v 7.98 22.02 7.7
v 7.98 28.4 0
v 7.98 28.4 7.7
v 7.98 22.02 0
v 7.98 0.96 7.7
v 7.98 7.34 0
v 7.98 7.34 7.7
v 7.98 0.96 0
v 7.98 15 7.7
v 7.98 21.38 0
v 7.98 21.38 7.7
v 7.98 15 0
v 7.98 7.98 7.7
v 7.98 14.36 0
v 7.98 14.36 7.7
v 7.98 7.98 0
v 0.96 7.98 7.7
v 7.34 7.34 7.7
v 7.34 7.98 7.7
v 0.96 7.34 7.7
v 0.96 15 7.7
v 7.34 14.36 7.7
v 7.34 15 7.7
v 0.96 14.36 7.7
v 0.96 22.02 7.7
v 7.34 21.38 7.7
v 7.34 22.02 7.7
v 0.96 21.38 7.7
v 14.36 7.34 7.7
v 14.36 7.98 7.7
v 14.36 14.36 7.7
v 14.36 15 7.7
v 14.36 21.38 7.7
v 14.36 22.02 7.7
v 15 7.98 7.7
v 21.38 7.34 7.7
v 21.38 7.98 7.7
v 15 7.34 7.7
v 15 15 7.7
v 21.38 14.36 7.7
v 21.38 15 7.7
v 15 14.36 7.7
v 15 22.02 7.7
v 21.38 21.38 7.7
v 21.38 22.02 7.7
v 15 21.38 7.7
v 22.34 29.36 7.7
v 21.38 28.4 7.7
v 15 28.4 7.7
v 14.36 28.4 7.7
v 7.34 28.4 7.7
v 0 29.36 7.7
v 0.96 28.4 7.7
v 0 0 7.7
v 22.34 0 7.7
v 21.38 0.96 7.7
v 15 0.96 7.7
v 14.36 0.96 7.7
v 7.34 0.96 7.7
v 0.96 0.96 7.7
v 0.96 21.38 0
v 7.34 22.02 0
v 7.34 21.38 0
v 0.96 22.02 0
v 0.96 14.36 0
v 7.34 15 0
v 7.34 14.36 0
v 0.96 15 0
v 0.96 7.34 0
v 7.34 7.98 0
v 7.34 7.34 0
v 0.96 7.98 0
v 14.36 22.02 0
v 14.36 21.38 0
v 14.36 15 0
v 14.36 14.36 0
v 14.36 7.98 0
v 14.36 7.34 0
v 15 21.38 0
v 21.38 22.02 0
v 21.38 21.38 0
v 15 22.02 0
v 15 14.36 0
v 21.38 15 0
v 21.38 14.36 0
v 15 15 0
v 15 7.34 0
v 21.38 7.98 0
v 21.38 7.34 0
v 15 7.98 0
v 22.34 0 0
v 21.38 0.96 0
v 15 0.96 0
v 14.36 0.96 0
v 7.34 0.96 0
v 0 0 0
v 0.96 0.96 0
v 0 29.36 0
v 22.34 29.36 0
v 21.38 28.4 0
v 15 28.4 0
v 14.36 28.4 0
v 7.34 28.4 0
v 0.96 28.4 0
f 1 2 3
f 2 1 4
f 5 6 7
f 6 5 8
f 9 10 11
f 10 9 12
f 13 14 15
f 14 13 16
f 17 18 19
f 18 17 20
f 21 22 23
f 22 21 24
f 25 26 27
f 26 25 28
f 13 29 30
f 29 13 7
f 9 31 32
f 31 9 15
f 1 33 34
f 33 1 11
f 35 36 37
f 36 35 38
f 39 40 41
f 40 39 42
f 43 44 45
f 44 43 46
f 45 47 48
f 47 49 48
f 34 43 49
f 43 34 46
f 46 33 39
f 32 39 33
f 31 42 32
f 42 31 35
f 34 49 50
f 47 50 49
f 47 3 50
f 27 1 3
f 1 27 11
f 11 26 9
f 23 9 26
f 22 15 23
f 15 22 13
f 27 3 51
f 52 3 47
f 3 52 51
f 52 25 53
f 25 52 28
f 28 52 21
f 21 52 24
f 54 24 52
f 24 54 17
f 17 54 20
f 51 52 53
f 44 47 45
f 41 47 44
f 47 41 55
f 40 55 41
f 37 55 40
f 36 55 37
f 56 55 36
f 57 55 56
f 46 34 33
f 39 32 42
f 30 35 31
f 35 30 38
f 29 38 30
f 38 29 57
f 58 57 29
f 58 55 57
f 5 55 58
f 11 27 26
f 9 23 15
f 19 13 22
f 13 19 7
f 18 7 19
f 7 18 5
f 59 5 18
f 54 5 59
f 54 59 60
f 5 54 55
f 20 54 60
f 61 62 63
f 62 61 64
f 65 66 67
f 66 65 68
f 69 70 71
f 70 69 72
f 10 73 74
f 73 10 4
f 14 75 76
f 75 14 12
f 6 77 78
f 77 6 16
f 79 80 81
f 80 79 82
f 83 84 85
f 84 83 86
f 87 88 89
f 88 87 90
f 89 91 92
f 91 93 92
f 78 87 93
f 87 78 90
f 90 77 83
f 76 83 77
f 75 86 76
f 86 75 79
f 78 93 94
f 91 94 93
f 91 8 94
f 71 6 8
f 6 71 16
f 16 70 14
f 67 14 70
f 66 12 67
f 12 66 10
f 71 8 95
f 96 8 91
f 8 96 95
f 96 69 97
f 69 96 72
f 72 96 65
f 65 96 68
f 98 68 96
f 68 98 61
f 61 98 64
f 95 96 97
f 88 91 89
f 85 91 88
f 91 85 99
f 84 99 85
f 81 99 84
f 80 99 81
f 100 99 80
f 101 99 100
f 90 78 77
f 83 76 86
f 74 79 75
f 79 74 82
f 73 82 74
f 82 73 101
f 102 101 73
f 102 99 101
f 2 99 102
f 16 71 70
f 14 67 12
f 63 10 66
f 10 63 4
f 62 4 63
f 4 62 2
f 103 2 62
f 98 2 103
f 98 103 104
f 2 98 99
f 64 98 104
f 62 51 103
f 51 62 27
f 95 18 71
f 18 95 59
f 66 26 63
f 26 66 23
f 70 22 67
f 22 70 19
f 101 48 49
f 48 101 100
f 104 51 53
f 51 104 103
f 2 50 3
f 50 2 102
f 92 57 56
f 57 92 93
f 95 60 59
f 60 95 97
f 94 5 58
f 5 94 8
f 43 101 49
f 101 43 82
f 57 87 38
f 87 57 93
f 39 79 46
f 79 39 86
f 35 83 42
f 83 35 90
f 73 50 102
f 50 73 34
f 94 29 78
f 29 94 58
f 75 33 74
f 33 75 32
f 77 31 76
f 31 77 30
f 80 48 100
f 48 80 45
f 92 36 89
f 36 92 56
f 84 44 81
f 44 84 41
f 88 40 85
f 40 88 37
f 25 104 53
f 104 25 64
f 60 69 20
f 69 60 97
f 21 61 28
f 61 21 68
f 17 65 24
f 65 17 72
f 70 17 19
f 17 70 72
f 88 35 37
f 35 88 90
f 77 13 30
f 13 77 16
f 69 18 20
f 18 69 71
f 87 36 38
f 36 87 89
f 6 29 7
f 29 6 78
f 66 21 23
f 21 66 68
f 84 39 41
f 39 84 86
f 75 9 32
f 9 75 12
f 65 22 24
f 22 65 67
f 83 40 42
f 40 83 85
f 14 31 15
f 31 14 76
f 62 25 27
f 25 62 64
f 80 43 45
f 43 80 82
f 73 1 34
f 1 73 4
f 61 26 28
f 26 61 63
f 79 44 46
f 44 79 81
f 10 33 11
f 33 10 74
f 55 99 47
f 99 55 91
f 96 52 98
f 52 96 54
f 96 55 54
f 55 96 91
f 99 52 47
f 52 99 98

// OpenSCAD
// -------------------------------------------------------------------------------------------------

// Parametric Ikea Expedit/Kallax shelving units scale model

// © anton@cking.be
//   https://www.youmagine.com/users/ant0ni0
//   https://www.thingiverse.com/ant0ni0

// all sizes are in mm

// GLOBAL PARAMETERS -------------------------------------------------------------------------------

/* [Shelves] */

type = "Kallax"; // [Expedit,Kallax]

scale = 0.02; // [1:1/1,0.5:1/2,0.2:1/5,0.1:1/10,0.05:1/20,0.02:1/50,0.01:1/100,0.005:1/200]

color = "White"; // [White,Birch,Green,Pink,Red,Black]

// #compartments in horizontal direction
cols = 3; // [1:5]

// #compartments in vertical direction
rows = 4; // [1:5]

/* [Build] */

build = "Print"; // [Display,Print]

// add some door inserts?
doors = "No"; // [Yes,No]

// add some drawers inserts?
drawers = "No"; // [Yes,No]

// add some Lekman boxes?
boxes = "No"; // [Yes,No]

/* [Hidden] */

yes = true;
no = false;

right = 1;
left  = 2;

white = [1.00, 1.00, 1.00];
birch = [0.82, 0.75, 0.60];
green = [0.75, 0.85, 0.70];
pink  = [0.80, 0.71, 0.74];
red   = [1.00, 0.10, 0.10];
black = [0.12, 0.12, 0.08];

flat  = yes;     // use no for display, yes for 3D printing

cubeSize = 319; // same for expedit and kallax
depth    = 385;

// CALCULATED VALUES -------------------------------------------------------------------------------

de = (type == "Expedit") ? 50 : 48; // thickness of outside boards
di = 32; // thickness of shelves

// BUILD -------------------------------------------------------------------------------------------

// uncomment one of the following:
custom(); // whatever what's been chosen in Customizer
//demo1();
//demo2();
//demo3();
//shelves(1,4);
//door();
//drawers();
//lekman();

// FUNCTIONS ---------------------------------------------------------------------------------------

function clr(name) = 
    name == "White" ? white :
    name == "Birch" ? birch :
    name == "Green" ? green :
    name == "Pink"  ? pink  :
    name == "Red"   ? red   :
    name == "Black" ? black : white;

// MODULES -----------------------------------------------------------------------------------------

module custom()
{
    clr = clr(color);
    
    shelves(cols,rows,clr);
    
    if (doors == "Yes")
    {
        row = min(4,rows);
        door(1,row,clr,right);
        if (cols > 1)
            door(cols,row,clr,left);
    }
    
    if (drawers == "Yes")
    {
        row = max(1,min(3,rows-1));
        first = min(2,cols);
        last = max(1,cols-1);
        for (col=[first:last])
            drawers(col,row,clr);
    }
    
    if (boxes == "Yes")
    {
        if (rows > 1 || (doors != "Yes" && drawers != "Yes"))
        {
            for (col=[1:cols])
                lekman(col,1);
        }
    }
}

module demo1()
{
    shelves(5,5);
    
    for (col=[1:1:5])
        lekman(col,2,white);
}

module demo2()
{
    shelves(4,4, birch);

    door(1,3, black, right);
    drawers(2,3, black);
    drawers(3,3, black);
    door(4,3, black, left);

    for (col=[1,4])
        for (row=[1,2])
            lekman(col,row);
}

module demo3()
{
    // shelves(5,1, pink);
    drawers(1);
    door(2);
    lekman(3);
    door(4, open=left);
}

module shelves(w, h, color=color)
{
    wi = w * cubeSize + (w-1) * di;
    hi = h * cubeSize + (h-1) * di;
    
    we = wi + 2 * de;
    he = hi + 2 * di;
    
    color(color)
    scale(scale)
    rotate(build=="Print" ? [0,0,0] : [90,0,0])
    union()
    {
        cube([we,de,depth]);
        translate([0,de,0]) cube([de,hi,depth]);
        translate([wi+de,de,0]) cube([de,hi,depth]);
        translate([0,hi+de,0]) cube([we,de,depth]);
        
        for (i=[1:1:w-1])
            translate([de-di+i*(cubeSize+di),de,0]) cube([di,hi,depth]);
        
        for (i=[1:1:h-1])
            translate([de,de-di+i*(cubeSize+di),0]) cube([wi,di,depth]);
    }
}

module drawers(col=1, row=1, color=color)
{
    slack  = 2; // increase this if the printed part doesn't fit into the space
    margin = 6;
    
    w = cubeSize - 2 * margin;
    h = (cubeSize - 3 * margin) / 2;
    
    x = de + (col-1) * (cubeSize + di);
    y = de + (row-1) * (cubeSize + di);
    
    scale(scale)
    rotate(build=="Print" ? [0,0,0] : [90,0,0])
    {
        union()
        {
            color(color) translate([x+slack,y,0]) cube([cubeSize-2*slack,cubeSize-2*slack,depth-di]);
            for (i=[0,1])
            {
                color(color) translate([x+margin,y+margin+i*(h+margin),depth-di]) cube([w,h,di]);
                color([0.8,0.8,0.8]) translate([x+cubeSize/2,y+margin+h/2+i*(h+margin),depth]) cylinder(d=12,h=12);
            }
        }
    }
}

module door(col=1, row=1, color=color, open=right)
{
    slack  = 2;
    margin = 6;
    
    w = cubeSize - 2 * margin;
    
    x = de + (col-1) * (cubeSize + di);
    y = de + (row-1) * (cubeSize + di);
    
    xKnob = (open==right) ? cubeSize-30 : 30;
    
    scale(scale)
    rotate(build=="Print" ? [0,0,0] : [90,0,0])
    {
        union()
        {
            color(color) translate([x+slack,y,0]) cube([cubeSize-2*slack,cubeSize-2*slack,depth-di]);
            color(color) translate([x+margin,y+margin,depth-di]) cube([w,w,di]);
            color([0.8,0.8,0.8]) translate([x+xKnob,y+margin+w/2,depth]) cylinder(d=12,h=12);
        }
    }
}

module lekman(col=1, row=1, color=[0.3,0.3,0.3,0.8])
{
    w = 330;
    d = 370;
    
    x = de + (col-1) * (cubeSize + di) + ((cubeSize - w) / 2);
    y = de + (row-1) * (cubeSize + di);
    z = (depth - d) / 2;
    
    color(color)
    scale(scale)
    rotate(build=="Print" ? [0,0,0] : [90,0,0])
    {
        difference()
        {
            union()
            {
                for (i=[0,1])
                {
                    translate([x,y,z+i*(d-di)]) cube([w,w,di]);
                    translate([x+i*(w-di),y,z+di]) cube([di,w,d-2*di]);
                }
                translate([x+di,y,z+di]) cube([w-2*di,di,d-2*di]);
            }
            translate([x+cubeSize/2,y+cubeSize/2,0])
            {
                for (dx=[-50:40:40])
                    for (dy=[-50:40:40])
                        translate([dx,dy,-1])
                        cube([20,20,depth+2]);
            }
        }
    }
}

// -------------------------------------------------------------------------------------------------
